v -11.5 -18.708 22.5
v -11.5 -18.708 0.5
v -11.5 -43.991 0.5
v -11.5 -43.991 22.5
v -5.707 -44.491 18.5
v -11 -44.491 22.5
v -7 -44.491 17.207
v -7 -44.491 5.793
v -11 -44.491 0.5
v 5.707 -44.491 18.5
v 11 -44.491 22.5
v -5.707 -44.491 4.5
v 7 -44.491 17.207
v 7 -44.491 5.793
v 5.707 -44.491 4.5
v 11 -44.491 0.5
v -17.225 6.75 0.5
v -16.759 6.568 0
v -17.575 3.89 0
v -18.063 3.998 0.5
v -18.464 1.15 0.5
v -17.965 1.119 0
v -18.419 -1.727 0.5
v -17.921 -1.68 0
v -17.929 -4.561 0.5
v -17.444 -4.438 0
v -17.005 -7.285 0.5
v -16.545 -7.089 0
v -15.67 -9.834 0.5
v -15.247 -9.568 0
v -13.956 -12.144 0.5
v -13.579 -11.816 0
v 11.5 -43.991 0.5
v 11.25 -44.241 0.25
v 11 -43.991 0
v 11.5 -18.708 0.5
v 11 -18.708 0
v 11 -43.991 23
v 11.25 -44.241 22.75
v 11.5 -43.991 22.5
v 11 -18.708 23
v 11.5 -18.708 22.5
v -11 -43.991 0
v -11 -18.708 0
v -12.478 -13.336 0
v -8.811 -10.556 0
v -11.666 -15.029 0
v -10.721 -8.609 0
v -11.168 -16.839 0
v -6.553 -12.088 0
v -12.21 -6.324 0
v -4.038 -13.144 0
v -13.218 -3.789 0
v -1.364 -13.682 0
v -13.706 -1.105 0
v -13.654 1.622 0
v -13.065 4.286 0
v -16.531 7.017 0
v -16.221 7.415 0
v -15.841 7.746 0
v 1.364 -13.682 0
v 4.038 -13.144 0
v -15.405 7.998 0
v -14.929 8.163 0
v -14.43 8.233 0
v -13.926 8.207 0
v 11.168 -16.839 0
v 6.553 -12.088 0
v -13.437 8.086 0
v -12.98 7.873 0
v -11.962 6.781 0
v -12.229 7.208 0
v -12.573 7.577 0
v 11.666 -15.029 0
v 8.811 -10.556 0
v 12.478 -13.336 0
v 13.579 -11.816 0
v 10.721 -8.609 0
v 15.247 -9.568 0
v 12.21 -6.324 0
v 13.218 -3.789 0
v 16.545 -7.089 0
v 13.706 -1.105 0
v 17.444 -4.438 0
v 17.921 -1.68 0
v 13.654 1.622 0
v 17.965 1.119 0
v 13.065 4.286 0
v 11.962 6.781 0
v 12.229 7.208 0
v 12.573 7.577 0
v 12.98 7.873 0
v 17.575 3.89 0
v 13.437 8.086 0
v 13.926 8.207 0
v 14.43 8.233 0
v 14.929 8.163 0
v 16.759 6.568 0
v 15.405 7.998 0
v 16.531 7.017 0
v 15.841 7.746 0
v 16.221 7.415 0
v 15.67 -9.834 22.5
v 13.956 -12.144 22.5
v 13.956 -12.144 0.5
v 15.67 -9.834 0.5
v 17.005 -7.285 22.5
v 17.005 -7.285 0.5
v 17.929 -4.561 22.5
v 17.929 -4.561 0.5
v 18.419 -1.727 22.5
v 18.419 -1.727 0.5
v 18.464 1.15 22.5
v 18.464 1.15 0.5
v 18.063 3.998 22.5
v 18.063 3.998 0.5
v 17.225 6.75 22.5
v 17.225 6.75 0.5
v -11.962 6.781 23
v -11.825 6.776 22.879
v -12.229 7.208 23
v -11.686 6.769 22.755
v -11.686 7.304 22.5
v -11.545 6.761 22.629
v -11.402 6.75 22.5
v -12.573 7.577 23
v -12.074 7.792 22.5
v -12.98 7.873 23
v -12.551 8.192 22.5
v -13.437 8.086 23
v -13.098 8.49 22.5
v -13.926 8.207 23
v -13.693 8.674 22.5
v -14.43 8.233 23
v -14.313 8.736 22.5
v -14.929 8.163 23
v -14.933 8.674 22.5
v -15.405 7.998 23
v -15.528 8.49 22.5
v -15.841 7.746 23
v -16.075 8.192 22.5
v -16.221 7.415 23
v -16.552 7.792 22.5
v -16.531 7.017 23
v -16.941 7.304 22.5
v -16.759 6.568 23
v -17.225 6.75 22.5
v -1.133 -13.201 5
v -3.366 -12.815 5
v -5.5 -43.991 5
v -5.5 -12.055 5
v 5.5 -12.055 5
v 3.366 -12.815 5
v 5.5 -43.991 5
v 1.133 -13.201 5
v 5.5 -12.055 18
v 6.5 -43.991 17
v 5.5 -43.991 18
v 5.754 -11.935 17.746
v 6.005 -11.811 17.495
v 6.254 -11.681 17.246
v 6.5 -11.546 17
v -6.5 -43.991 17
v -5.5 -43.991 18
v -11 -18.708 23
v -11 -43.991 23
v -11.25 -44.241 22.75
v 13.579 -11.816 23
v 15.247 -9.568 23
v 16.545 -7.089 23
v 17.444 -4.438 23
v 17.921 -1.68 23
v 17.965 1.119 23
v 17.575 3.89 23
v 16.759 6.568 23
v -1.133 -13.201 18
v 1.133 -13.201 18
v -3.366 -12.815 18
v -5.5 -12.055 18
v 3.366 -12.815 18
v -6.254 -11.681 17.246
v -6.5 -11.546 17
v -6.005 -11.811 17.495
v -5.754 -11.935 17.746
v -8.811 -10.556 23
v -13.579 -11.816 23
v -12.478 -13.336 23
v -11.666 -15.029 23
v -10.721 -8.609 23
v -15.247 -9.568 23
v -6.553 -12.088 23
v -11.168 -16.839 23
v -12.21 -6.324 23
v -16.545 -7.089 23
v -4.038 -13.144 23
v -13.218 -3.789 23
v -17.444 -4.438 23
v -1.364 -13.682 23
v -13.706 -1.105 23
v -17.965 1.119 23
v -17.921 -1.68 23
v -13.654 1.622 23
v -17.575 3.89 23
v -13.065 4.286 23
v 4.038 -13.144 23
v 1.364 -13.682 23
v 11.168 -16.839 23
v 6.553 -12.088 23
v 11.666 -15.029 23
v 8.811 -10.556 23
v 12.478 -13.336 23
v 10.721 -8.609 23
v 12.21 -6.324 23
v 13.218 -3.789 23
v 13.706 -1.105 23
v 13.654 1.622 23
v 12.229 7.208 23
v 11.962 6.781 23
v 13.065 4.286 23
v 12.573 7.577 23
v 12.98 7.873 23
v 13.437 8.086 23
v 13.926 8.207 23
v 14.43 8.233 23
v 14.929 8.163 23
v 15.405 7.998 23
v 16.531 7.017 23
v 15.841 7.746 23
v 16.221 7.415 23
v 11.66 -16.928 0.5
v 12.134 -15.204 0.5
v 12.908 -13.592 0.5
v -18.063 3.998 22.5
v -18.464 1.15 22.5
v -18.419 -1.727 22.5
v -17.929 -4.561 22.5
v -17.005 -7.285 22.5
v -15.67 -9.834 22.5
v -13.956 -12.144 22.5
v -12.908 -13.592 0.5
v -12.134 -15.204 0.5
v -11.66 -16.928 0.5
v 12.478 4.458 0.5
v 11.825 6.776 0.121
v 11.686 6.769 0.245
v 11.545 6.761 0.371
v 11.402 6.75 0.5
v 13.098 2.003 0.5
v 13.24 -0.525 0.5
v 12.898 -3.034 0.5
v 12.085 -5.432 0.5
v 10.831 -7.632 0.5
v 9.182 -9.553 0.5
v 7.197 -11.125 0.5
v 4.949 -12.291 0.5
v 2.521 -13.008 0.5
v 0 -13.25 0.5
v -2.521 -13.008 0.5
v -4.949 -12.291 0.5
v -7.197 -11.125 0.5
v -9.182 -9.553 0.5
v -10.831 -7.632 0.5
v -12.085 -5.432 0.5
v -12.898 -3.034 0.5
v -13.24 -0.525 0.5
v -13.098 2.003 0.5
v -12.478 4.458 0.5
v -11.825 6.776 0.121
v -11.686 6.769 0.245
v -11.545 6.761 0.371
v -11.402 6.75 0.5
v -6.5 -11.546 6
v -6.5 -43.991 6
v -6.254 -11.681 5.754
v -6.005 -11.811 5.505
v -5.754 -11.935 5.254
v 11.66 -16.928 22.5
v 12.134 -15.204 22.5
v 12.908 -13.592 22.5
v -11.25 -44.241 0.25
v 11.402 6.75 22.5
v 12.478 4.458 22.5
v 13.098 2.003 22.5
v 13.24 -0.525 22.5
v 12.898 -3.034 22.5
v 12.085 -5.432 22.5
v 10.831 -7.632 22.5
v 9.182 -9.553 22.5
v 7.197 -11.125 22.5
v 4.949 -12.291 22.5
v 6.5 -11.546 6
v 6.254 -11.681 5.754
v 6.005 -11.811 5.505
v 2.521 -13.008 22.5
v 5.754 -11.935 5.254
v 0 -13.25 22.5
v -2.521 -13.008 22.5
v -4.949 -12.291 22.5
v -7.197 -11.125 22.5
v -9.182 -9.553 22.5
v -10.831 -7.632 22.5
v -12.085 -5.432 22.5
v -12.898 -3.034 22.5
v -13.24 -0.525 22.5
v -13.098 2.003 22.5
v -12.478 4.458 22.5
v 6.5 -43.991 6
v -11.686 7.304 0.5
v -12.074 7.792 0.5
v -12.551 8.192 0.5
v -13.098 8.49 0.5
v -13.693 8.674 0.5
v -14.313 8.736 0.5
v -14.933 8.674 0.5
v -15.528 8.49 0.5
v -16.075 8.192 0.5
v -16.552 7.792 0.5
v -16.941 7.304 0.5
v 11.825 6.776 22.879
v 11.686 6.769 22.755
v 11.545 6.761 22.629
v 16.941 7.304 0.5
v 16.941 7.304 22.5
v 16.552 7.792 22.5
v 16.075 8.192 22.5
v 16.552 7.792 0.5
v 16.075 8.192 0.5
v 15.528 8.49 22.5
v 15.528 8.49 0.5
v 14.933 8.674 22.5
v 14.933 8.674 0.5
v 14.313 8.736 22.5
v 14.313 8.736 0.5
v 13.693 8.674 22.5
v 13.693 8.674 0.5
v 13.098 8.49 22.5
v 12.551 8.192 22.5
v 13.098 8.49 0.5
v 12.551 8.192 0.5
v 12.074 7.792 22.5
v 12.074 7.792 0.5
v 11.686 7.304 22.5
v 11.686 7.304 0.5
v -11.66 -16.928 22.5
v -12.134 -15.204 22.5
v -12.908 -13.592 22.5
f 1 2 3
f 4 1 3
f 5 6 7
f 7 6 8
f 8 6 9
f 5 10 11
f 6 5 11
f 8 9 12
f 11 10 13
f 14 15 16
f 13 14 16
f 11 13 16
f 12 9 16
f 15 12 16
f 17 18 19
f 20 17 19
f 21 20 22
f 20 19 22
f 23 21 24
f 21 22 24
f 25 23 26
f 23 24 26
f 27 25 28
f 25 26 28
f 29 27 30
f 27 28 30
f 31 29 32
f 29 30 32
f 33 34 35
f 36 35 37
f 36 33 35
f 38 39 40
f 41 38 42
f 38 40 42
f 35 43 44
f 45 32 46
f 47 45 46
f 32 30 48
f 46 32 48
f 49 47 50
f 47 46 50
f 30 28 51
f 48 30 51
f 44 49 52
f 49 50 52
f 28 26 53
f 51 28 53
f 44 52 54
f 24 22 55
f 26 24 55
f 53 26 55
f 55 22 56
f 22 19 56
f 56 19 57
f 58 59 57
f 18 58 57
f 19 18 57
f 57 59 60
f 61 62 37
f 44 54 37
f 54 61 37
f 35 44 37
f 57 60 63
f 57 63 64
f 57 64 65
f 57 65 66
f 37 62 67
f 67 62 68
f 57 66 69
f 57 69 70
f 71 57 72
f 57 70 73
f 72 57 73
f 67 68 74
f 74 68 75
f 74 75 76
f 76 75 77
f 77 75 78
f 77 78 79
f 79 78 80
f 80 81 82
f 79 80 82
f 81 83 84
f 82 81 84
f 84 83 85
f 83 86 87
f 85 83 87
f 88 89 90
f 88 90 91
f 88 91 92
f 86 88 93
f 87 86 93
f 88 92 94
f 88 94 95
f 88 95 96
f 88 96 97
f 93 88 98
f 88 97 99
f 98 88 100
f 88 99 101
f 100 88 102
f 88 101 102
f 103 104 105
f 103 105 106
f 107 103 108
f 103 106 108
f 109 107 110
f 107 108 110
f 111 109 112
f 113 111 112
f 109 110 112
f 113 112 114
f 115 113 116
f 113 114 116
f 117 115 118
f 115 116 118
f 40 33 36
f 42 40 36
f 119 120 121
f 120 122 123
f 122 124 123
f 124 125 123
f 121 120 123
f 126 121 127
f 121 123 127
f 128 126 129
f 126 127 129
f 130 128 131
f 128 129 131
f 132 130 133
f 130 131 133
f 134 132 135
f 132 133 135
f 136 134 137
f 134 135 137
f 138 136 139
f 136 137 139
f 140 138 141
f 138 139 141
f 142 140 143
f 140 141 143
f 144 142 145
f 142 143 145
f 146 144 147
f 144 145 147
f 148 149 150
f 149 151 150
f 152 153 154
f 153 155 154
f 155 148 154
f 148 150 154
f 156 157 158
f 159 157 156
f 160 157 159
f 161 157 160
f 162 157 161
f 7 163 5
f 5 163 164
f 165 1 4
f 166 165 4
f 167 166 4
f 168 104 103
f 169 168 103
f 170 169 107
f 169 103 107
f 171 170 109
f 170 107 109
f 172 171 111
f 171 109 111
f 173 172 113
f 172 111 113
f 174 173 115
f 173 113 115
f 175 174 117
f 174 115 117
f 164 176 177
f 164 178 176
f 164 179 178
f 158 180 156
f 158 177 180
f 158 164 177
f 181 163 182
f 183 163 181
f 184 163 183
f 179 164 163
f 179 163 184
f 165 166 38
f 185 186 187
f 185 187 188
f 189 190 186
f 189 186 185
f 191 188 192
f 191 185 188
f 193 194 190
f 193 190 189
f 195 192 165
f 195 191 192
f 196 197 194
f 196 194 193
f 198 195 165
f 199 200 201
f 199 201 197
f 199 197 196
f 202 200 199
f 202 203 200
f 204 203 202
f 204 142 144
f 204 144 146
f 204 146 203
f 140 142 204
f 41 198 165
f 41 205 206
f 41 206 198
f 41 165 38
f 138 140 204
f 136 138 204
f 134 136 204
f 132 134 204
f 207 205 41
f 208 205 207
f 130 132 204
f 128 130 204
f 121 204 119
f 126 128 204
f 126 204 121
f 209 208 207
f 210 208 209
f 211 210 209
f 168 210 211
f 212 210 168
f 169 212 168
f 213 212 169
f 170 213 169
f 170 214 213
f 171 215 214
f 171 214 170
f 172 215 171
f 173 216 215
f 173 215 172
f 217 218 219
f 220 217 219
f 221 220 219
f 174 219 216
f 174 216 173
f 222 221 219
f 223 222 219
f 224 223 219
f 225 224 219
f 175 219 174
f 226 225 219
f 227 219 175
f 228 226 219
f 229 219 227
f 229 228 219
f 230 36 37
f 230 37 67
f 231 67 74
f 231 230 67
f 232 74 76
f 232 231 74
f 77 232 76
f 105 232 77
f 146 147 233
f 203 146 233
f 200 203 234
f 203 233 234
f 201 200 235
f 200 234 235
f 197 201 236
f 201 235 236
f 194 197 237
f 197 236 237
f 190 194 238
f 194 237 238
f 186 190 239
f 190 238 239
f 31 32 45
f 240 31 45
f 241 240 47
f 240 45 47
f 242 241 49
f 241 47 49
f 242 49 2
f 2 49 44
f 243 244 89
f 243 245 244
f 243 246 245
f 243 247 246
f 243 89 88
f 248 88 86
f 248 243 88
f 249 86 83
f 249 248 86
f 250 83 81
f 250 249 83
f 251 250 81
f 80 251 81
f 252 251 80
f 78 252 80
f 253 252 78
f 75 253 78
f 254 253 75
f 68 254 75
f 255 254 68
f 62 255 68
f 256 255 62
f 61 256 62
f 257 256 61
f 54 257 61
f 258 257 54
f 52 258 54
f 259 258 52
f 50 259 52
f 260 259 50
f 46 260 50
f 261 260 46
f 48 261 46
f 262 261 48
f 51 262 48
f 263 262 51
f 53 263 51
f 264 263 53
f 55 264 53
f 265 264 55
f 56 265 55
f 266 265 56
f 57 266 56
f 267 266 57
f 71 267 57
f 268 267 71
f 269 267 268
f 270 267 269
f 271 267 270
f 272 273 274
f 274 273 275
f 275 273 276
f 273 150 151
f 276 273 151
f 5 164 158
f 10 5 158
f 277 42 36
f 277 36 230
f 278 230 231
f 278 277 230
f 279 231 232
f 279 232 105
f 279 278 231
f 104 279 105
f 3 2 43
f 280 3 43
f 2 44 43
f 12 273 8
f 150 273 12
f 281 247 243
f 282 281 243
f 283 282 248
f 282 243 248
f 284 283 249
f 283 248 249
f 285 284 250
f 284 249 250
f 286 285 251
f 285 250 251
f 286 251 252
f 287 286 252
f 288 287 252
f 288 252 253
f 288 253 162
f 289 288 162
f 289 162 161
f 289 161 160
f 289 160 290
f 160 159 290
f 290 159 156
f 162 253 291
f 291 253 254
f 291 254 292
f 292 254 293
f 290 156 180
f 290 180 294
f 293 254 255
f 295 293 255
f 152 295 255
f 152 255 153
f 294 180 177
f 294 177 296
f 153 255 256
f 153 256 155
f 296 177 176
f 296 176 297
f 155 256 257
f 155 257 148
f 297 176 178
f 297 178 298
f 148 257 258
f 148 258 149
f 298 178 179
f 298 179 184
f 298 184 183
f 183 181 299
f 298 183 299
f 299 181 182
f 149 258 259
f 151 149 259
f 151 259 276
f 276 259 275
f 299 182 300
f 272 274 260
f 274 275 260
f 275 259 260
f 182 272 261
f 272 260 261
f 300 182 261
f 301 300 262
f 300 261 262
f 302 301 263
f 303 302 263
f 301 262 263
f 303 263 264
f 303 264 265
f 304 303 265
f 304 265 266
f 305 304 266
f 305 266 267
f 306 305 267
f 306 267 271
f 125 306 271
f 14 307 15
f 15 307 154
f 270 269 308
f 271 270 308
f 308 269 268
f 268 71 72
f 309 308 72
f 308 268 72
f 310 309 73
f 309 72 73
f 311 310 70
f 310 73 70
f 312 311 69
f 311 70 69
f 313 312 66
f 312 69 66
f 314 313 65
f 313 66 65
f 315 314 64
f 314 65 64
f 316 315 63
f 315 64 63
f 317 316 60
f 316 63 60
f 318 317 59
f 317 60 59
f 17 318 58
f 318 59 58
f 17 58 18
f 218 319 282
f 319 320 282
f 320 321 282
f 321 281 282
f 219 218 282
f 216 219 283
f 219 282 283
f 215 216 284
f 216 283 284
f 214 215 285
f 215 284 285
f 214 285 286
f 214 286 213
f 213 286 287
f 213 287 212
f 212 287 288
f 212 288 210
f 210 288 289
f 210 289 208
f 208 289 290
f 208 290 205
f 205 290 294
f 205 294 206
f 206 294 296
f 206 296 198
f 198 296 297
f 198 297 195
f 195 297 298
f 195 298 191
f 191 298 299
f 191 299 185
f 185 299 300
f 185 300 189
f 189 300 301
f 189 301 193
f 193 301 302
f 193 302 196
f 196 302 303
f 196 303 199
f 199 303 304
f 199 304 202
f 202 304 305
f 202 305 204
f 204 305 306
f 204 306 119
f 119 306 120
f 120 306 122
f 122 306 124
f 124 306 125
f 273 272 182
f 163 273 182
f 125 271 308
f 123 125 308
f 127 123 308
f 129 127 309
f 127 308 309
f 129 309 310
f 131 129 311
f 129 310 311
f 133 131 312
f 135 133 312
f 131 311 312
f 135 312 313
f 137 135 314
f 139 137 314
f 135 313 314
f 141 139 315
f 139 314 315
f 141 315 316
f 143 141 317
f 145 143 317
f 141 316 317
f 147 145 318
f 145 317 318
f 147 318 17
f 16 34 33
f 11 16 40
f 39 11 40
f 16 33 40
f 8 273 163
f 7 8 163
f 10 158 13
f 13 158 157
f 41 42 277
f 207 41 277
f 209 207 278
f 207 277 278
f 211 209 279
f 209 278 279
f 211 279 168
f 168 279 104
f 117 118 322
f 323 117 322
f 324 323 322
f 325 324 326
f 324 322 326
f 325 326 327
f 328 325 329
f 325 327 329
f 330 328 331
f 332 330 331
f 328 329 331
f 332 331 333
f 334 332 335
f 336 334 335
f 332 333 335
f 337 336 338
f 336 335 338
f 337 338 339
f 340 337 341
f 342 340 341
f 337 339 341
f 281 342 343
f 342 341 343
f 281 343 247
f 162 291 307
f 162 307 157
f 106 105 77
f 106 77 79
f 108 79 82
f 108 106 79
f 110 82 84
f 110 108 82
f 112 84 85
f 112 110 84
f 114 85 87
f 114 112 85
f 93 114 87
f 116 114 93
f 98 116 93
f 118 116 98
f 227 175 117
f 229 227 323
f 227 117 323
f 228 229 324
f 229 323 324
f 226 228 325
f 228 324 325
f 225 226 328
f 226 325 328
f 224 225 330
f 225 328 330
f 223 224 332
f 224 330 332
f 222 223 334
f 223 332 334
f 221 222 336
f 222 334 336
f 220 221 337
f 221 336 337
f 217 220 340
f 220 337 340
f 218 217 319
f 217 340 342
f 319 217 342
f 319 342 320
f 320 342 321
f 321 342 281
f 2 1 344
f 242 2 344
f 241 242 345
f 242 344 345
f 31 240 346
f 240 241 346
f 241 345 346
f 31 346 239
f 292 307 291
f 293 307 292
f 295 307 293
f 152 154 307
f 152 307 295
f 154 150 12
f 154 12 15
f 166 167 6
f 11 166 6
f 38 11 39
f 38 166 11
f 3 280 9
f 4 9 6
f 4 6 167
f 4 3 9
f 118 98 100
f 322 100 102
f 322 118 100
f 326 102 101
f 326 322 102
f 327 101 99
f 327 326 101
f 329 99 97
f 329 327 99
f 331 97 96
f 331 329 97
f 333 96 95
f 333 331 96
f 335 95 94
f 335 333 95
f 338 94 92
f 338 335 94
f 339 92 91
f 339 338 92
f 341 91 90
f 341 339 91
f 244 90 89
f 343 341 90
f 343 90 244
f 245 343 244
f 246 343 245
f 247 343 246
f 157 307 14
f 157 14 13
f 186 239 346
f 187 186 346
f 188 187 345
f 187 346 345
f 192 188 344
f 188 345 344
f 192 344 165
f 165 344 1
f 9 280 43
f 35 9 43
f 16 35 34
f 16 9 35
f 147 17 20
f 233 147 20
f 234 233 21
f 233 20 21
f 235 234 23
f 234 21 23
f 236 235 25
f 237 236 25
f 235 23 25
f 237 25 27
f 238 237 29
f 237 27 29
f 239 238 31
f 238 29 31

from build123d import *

# Parameters (mm, degrees)
BOSS_EXTRUDE1_DEPTH     = 23
FILLET1_R               = 10
CHAMFER1_SIZE           = 0.5
CUT_EXTRUDE1_REACH      = 62.864
CUT_EXTRUDE1_END_RADIUS = 13.25
SKETCH2_W               = 13
SKETCH2_H               = 13
CHAMFER2_SIZE           = 1
CHAMFER3_SIZE           = 0.5


with BuildPart() as part:
    # Sketch1 → Boss-Extrude1 (new body)
    with BuildSketch(Plane.XY):
        with BuildLine():
            Line((-11.5, -14.491376746), (-11.5, -44.491376746))
            Line((-11.5, -44.491376746), (11.5, -44.491376746))
            Line((11.5, -44.491376746), (11.5, -14.491376746))
            ThreePointArc((11.5, -14.491376746), (17.862669336, -4.814046549), (17.224619009, 6.75))
            ThreePointArc((17.224619009, 6.75), (14.31318663, 8.736071822), (11.401754251, 6.75))
            ThreePointArc((11.401754251, 6.75), (0, -13.25), (-11.401754251, 6.75))
            ThreePointArc((-11.401754251, 6.75), (-14.31318663, 8.736071822), (-17.224619009, 6.75))
            ThreePointArc((-17.224619009, 6.75), (-17.862669336, -4.814046549), (-11.5, -14.491376746))
        make_face()
    extrude(amount=BOSS_EXTRUDE1_DEPTH)

    # Fillet1
    fillet1_edges = [part.edges().sort_by_distance(p)[0] for p in [
        (-11.5, -14.491376746, 11.5),
        (11.5, -14.491376746, 11.5),
    ]]
    fillet(fillet1_edges, radius=FILLET1_R)

    # Chamfer1
    chamfer1_edges = [part.edges().sort_by_distance(p)[0] for p in [
        (0, -13.25, 0),
        (14.31318663, 8.736071822, 0),
        (11.5, -31.59983184, 0),
        (14.31318663, 8.736071822, 23),
        (0, -13.25, 23),
        (-14.31318663, 8.736071822, 23),
        (-18.229248977, -3.153487233, 23),
        (-11.5, -31.59983184, 0),
        (-11.5, -31.59983184, 23),
        (18.229248977, -3.153487233, 0),
        (18.229248977, -3.153487233, 23),
        (-12.134141884, -15.203903714, 0),
        (-12.134141884, -15.203903714, 23),
        (12.134141884, -15.203903714, 0),
        (12.134141884, -15.203903714, 23),
        (0, -44.491376746, 23),
        (11.5, -31.59983184, 23),
        (0, -44.491376746, 0),
        (-18.229248977, -3.153487233, 0),
        (-14.31318663, 8.736071822, 0),
    ]]
    chamfer(chamfer1_edges, length=CHAMFER1_SIZE)

    # Cut-Extrude1: up to this cylinder (the profile starts outside it)
    cut_extrude1_end = Plane(origin=(0, 0, 11.5), z_dir=(0, 0, -1)) * Cylinder(CUT_EXTRUDE1_END_RADIUS, 153.228, mode=Mode.PRIVATE)
    # Sketch2 → Cut-Extrude1 (cut, up to the surface)
    with BuildSketch(Plane.XZ.offset(44.491376746), mode=Mode.PRIVATE) as cut_extrude1_sk1:
        with Locations((0, 11.5)):
            Rectangle(SKETCH2_W, SKETCH2_H)
    cut_extrude1_tool1 = extrude(cut_extrude1_sk1.sketch, amount=-CUT_EXTRUDE1_REACH, mode=Mode.PRIVATE) - cut_extrude1_end
    add(cut_extrude1_tool1.solids().sort_by_distance((0, -44.491377, 11.5))[0], mode=Mode.SUBTRACT)

    # Chamfer2
    chamfer2_edges = [part.edges().sort_by_distance(p)[0] for p in [
        (-6.5, -28.018739992, 5),
        (-6.5, -28.018739992, 18),
        (6.5, -28.018739992, 18),
        (6.5, -28.018739992, 5),
    ]]
    chamfer(chamfer2_edges, length=CHAMFER2_SIZE)

    # Chamfer3
    chamfer3_edges = [part.edges().sort_by_distance(p)[0] for p in [
        (0, -44.491376746, 5),
        (-6.5, -44.491376746, 11.5),
        (6.5, -44.491376746, 11.5),
        (0, -44.491376746, 18),
        (-6, -44.491376746, 5.5),
        (6, -44.491376746, 5.5),
        (6, -44.491376746, 17.5),
        (-6, -44.491376746, 17.5),
        (-11.5, -44.491376746, 11.5),
        (11.5, -44.491376746, 11.5),
    ]]
    chamfer(chamfer3_edges, length=CHAMFER3_SIZE)


solid = part.part
